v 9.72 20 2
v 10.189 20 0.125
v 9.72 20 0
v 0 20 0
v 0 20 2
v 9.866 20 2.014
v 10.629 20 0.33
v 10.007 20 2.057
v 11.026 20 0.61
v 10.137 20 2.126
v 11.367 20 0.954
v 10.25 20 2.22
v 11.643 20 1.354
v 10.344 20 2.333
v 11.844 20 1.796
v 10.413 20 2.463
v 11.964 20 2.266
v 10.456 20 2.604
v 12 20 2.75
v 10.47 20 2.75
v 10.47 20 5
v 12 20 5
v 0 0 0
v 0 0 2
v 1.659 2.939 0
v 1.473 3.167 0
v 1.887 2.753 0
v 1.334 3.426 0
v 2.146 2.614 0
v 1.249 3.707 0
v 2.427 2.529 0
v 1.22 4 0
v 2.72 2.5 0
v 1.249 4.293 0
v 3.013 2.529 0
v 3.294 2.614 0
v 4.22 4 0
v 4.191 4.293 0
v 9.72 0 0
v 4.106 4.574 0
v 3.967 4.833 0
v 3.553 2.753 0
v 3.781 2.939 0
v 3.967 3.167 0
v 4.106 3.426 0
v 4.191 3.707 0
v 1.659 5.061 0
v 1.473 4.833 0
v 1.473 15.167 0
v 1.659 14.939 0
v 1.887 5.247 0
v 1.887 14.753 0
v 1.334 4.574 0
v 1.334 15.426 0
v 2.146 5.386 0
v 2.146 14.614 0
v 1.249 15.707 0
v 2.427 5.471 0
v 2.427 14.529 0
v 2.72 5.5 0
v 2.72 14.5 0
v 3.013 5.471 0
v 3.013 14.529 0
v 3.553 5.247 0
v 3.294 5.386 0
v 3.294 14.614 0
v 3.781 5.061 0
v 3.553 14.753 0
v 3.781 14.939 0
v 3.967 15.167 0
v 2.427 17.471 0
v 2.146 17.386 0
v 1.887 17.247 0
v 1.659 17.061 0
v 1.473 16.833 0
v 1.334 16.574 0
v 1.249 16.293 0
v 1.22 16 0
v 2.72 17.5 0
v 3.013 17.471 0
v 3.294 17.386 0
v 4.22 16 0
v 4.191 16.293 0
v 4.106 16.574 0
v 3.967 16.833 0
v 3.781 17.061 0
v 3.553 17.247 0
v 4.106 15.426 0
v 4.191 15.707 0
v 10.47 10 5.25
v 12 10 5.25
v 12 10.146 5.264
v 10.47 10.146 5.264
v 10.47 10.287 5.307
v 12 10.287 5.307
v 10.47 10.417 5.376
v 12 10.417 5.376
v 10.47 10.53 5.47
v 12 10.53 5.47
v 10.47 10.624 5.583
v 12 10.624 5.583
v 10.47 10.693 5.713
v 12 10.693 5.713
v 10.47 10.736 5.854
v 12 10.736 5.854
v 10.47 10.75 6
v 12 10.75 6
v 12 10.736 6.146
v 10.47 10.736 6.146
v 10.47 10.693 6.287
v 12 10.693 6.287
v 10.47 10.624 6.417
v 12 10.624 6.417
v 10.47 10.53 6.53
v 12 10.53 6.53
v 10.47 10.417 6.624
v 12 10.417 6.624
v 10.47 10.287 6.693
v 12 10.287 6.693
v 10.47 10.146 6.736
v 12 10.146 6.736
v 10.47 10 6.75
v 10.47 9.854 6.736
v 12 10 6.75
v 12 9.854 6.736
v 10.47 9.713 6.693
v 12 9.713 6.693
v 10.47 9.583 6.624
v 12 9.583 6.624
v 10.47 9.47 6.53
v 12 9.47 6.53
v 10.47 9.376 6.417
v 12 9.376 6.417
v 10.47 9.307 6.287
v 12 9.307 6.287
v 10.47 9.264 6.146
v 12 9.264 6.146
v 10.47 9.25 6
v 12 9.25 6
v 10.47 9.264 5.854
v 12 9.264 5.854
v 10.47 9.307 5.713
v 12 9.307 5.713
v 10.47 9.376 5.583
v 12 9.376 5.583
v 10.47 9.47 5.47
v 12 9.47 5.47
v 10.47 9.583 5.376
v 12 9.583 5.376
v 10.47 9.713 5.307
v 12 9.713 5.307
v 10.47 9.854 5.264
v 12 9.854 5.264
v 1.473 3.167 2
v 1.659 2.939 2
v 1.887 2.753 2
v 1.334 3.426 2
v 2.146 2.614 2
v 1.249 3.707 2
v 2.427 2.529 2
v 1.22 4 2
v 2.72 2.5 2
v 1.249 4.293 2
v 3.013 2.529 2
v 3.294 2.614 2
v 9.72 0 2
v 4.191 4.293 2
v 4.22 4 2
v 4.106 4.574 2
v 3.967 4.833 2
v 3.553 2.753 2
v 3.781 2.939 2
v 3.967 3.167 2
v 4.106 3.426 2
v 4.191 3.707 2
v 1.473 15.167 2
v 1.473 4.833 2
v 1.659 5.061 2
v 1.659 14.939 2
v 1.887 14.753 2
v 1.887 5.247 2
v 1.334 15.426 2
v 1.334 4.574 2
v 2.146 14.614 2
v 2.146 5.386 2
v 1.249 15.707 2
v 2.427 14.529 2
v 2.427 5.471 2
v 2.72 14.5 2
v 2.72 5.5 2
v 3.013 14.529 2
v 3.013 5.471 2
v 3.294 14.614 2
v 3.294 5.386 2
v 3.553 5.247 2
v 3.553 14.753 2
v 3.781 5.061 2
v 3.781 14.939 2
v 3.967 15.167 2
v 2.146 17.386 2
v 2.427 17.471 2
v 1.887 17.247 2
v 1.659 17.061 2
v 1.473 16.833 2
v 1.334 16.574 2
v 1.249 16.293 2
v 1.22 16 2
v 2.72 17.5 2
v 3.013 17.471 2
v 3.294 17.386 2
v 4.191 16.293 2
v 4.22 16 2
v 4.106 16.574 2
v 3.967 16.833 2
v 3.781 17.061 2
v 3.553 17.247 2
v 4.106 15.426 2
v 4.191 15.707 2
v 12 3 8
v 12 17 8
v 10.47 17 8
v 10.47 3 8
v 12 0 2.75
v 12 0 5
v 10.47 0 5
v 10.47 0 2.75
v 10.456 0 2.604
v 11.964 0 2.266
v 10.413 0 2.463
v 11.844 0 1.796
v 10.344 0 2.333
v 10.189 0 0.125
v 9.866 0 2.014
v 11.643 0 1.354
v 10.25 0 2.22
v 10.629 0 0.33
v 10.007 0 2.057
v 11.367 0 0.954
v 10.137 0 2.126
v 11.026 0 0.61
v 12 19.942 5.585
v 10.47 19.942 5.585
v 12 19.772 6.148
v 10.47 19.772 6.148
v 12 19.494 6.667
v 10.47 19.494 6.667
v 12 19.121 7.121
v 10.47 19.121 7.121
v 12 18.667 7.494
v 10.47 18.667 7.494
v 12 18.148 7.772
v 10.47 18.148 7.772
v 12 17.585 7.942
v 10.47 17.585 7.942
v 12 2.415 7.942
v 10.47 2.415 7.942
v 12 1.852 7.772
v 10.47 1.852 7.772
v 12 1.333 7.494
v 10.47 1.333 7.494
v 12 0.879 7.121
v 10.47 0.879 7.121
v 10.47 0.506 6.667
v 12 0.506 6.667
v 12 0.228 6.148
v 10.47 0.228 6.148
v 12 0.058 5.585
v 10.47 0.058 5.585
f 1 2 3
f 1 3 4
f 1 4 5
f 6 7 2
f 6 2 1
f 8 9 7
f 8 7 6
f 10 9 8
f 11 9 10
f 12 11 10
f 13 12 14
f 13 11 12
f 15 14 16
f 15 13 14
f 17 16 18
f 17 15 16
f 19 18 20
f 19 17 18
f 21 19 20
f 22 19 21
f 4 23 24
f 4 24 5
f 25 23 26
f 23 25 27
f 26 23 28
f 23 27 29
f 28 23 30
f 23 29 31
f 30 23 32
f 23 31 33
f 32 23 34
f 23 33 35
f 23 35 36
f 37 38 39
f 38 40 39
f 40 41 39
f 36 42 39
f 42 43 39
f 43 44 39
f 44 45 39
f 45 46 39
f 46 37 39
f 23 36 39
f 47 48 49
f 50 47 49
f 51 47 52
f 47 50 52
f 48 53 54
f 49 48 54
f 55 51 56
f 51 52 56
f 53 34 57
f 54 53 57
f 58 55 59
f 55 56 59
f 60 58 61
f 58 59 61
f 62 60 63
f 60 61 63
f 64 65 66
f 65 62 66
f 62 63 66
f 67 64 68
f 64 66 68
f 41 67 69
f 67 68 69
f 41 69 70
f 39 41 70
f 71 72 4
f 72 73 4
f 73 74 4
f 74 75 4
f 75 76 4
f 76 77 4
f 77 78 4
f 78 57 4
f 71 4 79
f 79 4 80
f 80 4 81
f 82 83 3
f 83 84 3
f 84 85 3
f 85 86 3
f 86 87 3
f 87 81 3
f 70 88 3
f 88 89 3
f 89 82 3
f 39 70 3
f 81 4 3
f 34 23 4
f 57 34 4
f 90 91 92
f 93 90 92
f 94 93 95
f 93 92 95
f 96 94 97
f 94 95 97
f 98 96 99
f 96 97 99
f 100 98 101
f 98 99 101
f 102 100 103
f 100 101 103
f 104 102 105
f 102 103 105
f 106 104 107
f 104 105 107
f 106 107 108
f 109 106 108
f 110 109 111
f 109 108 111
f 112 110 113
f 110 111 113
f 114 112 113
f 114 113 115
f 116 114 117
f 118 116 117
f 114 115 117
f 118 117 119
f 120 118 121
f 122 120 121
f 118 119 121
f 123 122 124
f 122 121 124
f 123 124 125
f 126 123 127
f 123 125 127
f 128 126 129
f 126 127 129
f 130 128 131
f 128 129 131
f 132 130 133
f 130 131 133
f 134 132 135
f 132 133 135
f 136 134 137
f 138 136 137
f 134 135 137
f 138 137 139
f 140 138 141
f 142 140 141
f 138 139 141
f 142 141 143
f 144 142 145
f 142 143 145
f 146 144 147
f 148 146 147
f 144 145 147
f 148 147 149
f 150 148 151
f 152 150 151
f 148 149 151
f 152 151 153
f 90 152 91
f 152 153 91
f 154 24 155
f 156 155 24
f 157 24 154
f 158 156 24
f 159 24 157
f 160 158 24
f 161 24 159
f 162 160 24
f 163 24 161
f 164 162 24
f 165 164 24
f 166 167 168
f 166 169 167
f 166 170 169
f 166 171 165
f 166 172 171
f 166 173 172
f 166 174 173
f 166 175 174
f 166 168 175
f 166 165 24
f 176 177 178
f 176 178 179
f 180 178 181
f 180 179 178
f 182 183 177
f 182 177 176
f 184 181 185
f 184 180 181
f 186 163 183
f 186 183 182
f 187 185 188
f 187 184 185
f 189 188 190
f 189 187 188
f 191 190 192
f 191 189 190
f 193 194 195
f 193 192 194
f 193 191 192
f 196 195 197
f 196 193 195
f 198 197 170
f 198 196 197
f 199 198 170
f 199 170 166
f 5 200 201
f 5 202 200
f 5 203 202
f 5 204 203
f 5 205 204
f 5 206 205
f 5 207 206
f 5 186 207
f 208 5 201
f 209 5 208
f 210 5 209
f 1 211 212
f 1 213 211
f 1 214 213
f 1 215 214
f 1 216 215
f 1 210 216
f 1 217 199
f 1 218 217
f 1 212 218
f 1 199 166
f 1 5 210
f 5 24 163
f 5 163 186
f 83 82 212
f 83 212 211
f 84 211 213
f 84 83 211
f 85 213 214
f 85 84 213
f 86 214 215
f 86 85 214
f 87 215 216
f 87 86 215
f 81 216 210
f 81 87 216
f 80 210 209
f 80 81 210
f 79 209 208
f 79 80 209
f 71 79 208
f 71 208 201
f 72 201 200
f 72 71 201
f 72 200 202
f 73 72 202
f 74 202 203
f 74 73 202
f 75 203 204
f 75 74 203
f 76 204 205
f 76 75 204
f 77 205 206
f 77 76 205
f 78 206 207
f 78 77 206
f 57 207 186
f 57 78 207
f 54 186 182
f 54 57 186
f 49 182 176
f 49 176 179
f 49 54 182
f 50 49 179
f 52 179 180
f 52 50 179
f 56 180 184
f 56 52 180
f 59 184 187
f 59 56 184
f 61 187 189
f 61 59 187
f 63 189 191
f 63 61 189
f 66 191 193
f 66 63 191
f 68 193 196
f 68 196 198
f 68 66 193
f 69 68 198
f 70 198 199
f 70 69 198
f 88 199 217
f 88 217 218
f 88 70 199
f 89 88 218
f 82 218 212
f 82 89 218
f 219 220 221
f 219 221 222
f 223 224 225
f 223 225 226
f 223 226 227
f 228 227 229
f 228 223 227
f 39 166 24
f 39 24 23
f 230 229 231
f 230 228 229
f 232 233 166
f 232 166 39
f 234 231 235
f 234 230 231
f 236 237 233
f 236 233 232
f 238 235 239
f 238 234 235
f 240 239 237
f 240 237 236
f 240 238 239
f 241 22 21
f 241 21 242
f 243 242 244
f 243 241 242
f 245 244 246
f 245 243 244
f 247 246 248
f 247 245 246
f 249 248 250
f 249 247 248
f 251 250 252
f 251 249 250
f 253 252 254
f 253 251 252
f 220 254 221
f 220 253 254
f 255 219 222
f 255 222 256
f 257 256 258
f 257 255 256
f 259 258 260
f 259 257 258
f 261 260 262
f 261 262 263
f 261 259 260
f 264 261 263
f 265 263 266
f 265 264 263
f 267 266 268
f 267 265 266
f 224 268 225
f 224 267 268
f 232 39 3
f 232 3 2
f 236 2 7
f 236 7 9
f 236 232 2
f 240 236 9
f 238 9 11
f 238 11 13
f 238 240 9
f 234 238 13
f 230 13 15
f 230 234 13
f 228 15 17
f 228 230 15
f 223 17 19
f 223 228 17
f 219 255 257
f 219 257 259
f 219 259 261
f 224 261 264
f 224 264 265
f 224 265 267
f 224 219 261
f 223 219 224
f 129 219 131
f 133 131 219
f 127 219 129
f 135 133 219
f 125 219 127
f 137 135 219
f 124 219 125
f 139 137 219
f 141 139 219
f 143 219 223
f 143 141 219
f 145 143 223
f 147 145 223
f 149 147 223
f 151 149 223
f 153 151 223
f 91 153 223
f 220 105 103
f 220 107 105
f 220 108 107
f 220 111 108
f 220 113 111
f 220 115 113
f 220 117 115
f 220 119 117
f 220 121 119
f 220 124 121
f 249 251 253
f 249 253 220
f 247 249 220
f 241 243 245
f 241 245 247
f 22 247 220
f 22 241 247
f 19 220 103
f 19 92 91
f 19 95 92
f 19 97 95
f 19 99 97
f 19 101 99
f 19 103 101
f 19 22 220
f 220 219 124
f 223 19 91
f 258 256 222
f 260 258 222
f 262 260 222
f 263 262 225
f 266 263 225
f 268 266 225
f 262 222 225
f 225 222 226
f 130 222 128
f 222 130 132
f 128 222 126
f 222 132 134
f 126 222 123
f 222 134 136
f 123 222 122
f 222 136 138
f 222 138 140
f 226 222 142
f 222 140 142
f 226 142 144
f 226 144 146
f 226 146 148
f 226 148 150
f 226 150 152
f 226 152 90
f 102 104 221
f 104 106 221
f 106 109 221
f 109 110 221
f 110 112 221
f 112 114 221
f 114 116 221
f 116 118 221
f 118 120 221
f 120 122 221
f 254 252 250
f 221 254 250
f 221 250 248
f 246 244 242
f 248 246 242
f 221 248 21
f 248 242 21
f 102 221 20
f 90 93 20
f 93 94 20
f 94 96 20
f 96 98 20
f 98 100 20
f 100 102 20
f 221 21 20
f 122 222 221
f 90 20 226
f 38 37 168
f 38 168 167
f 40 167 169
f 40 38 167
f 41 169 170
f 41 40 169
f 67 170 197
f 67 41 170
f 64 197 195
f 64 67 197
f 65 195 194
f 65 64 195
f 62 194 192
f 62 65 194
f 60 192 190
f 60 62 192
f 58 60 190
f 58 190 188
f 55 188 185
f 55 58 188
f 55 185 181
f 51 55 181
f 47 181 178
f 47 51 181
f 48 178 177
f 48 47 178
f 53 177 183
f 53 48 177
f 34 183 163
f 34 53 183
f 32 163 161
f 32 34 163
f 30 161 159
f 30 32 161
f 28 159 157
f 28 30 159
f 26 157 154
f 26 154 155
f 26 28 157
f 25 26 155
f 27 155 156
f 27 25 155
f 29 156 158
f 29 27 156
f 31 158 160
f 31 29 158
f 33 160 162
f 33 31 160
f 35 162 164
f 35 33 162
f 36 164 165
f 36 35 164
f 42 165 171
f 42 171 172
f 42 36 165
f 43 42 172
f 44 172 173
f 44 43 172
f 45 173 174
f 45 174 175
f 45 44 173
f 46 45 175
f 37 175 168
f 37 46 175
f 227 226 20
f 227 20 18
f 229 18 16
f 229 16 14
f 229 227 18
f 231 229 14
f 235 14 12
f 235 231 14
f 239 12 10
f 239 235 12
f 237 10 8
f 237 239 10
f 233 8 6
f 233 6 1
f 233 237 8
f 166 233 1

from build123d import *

# Parameters (mm, degrees)
SKETCH1_W           = 9.72
SKETCH1_H           = 20
SKETCH1_R           = 1.5
BOSS_EXTRUDE1_DEPTH = 2
BOSS_EXTRUDE2_DEPTH = 20
SKETCH3_R           = 0.75
BOSS_EXTRUDE3_DEPTH = 1.53


with BuildPart() as part:
    # Sketch1 → Boss-Extrude1 (new body)
    with BuildSketch(Plane.XY):
        with Locations((4.86, 10)):
            Rectangle(SKETCH1_W, SKETCH1_H)
        with Locations((2.72, 16)):
            Circle(SKETCH1_R, mode=Mode.SUBTRACT)
        with Locations((2.72, 4)):
            Circle(SKETCH1_R, mode=Mode.SUBTRACT)
    extrude(amount=BOSS_EXTRUDE1_DEPTH)

    # Sketch2 → Boss-Extrude2 (add)
    with BuildSketch(Plane.XZ):
        with BuildLine():
            Line((9.72, 2), (9.72, 0))
            ThreePointArc((9.72, 0), (11.367131495, 0.954473399), (11.999702326, 2.75))
            Line((11.999702326, 2.75), (10.47, 2.75))
            ThreePointArc((10.47, 2.75), (10.250330086, 2.219669914), (9.72, 2))
        make_face()
    extrude(amount=-BOSS_EXTRUDE2_DEPTH)

    # Sketch3 → Boss-Extrude3 (add)
    with BuildSketch(Plane(origin=(12, 0, 0), x_dir=(0, 0, -1), z_dir=(1, 0, 0))):
        with BuildLine():
            Line((-2.75, 20), (-5, 20))
            ThreePointArc((-5, 20), (-7.121320344, 19.121320344), (-8, 17))
            Line((-8, 17), (-8, 3))
            ThreePointArc((-8, 3), (-7.121320344, 0.878679656), (-5, 0))
            Line((-5, 0), (-2.75, 0))
            Line((-2.75, 0), (-2.75, 20))
        make_face()
        with Locations((-6, 10)):
            Circle(SKETCH3_R, mode=Mode.SUBTRACT)
    extrude(amount=-BOSS_EXTRUDE3_DEPTH)


solid = part.part
